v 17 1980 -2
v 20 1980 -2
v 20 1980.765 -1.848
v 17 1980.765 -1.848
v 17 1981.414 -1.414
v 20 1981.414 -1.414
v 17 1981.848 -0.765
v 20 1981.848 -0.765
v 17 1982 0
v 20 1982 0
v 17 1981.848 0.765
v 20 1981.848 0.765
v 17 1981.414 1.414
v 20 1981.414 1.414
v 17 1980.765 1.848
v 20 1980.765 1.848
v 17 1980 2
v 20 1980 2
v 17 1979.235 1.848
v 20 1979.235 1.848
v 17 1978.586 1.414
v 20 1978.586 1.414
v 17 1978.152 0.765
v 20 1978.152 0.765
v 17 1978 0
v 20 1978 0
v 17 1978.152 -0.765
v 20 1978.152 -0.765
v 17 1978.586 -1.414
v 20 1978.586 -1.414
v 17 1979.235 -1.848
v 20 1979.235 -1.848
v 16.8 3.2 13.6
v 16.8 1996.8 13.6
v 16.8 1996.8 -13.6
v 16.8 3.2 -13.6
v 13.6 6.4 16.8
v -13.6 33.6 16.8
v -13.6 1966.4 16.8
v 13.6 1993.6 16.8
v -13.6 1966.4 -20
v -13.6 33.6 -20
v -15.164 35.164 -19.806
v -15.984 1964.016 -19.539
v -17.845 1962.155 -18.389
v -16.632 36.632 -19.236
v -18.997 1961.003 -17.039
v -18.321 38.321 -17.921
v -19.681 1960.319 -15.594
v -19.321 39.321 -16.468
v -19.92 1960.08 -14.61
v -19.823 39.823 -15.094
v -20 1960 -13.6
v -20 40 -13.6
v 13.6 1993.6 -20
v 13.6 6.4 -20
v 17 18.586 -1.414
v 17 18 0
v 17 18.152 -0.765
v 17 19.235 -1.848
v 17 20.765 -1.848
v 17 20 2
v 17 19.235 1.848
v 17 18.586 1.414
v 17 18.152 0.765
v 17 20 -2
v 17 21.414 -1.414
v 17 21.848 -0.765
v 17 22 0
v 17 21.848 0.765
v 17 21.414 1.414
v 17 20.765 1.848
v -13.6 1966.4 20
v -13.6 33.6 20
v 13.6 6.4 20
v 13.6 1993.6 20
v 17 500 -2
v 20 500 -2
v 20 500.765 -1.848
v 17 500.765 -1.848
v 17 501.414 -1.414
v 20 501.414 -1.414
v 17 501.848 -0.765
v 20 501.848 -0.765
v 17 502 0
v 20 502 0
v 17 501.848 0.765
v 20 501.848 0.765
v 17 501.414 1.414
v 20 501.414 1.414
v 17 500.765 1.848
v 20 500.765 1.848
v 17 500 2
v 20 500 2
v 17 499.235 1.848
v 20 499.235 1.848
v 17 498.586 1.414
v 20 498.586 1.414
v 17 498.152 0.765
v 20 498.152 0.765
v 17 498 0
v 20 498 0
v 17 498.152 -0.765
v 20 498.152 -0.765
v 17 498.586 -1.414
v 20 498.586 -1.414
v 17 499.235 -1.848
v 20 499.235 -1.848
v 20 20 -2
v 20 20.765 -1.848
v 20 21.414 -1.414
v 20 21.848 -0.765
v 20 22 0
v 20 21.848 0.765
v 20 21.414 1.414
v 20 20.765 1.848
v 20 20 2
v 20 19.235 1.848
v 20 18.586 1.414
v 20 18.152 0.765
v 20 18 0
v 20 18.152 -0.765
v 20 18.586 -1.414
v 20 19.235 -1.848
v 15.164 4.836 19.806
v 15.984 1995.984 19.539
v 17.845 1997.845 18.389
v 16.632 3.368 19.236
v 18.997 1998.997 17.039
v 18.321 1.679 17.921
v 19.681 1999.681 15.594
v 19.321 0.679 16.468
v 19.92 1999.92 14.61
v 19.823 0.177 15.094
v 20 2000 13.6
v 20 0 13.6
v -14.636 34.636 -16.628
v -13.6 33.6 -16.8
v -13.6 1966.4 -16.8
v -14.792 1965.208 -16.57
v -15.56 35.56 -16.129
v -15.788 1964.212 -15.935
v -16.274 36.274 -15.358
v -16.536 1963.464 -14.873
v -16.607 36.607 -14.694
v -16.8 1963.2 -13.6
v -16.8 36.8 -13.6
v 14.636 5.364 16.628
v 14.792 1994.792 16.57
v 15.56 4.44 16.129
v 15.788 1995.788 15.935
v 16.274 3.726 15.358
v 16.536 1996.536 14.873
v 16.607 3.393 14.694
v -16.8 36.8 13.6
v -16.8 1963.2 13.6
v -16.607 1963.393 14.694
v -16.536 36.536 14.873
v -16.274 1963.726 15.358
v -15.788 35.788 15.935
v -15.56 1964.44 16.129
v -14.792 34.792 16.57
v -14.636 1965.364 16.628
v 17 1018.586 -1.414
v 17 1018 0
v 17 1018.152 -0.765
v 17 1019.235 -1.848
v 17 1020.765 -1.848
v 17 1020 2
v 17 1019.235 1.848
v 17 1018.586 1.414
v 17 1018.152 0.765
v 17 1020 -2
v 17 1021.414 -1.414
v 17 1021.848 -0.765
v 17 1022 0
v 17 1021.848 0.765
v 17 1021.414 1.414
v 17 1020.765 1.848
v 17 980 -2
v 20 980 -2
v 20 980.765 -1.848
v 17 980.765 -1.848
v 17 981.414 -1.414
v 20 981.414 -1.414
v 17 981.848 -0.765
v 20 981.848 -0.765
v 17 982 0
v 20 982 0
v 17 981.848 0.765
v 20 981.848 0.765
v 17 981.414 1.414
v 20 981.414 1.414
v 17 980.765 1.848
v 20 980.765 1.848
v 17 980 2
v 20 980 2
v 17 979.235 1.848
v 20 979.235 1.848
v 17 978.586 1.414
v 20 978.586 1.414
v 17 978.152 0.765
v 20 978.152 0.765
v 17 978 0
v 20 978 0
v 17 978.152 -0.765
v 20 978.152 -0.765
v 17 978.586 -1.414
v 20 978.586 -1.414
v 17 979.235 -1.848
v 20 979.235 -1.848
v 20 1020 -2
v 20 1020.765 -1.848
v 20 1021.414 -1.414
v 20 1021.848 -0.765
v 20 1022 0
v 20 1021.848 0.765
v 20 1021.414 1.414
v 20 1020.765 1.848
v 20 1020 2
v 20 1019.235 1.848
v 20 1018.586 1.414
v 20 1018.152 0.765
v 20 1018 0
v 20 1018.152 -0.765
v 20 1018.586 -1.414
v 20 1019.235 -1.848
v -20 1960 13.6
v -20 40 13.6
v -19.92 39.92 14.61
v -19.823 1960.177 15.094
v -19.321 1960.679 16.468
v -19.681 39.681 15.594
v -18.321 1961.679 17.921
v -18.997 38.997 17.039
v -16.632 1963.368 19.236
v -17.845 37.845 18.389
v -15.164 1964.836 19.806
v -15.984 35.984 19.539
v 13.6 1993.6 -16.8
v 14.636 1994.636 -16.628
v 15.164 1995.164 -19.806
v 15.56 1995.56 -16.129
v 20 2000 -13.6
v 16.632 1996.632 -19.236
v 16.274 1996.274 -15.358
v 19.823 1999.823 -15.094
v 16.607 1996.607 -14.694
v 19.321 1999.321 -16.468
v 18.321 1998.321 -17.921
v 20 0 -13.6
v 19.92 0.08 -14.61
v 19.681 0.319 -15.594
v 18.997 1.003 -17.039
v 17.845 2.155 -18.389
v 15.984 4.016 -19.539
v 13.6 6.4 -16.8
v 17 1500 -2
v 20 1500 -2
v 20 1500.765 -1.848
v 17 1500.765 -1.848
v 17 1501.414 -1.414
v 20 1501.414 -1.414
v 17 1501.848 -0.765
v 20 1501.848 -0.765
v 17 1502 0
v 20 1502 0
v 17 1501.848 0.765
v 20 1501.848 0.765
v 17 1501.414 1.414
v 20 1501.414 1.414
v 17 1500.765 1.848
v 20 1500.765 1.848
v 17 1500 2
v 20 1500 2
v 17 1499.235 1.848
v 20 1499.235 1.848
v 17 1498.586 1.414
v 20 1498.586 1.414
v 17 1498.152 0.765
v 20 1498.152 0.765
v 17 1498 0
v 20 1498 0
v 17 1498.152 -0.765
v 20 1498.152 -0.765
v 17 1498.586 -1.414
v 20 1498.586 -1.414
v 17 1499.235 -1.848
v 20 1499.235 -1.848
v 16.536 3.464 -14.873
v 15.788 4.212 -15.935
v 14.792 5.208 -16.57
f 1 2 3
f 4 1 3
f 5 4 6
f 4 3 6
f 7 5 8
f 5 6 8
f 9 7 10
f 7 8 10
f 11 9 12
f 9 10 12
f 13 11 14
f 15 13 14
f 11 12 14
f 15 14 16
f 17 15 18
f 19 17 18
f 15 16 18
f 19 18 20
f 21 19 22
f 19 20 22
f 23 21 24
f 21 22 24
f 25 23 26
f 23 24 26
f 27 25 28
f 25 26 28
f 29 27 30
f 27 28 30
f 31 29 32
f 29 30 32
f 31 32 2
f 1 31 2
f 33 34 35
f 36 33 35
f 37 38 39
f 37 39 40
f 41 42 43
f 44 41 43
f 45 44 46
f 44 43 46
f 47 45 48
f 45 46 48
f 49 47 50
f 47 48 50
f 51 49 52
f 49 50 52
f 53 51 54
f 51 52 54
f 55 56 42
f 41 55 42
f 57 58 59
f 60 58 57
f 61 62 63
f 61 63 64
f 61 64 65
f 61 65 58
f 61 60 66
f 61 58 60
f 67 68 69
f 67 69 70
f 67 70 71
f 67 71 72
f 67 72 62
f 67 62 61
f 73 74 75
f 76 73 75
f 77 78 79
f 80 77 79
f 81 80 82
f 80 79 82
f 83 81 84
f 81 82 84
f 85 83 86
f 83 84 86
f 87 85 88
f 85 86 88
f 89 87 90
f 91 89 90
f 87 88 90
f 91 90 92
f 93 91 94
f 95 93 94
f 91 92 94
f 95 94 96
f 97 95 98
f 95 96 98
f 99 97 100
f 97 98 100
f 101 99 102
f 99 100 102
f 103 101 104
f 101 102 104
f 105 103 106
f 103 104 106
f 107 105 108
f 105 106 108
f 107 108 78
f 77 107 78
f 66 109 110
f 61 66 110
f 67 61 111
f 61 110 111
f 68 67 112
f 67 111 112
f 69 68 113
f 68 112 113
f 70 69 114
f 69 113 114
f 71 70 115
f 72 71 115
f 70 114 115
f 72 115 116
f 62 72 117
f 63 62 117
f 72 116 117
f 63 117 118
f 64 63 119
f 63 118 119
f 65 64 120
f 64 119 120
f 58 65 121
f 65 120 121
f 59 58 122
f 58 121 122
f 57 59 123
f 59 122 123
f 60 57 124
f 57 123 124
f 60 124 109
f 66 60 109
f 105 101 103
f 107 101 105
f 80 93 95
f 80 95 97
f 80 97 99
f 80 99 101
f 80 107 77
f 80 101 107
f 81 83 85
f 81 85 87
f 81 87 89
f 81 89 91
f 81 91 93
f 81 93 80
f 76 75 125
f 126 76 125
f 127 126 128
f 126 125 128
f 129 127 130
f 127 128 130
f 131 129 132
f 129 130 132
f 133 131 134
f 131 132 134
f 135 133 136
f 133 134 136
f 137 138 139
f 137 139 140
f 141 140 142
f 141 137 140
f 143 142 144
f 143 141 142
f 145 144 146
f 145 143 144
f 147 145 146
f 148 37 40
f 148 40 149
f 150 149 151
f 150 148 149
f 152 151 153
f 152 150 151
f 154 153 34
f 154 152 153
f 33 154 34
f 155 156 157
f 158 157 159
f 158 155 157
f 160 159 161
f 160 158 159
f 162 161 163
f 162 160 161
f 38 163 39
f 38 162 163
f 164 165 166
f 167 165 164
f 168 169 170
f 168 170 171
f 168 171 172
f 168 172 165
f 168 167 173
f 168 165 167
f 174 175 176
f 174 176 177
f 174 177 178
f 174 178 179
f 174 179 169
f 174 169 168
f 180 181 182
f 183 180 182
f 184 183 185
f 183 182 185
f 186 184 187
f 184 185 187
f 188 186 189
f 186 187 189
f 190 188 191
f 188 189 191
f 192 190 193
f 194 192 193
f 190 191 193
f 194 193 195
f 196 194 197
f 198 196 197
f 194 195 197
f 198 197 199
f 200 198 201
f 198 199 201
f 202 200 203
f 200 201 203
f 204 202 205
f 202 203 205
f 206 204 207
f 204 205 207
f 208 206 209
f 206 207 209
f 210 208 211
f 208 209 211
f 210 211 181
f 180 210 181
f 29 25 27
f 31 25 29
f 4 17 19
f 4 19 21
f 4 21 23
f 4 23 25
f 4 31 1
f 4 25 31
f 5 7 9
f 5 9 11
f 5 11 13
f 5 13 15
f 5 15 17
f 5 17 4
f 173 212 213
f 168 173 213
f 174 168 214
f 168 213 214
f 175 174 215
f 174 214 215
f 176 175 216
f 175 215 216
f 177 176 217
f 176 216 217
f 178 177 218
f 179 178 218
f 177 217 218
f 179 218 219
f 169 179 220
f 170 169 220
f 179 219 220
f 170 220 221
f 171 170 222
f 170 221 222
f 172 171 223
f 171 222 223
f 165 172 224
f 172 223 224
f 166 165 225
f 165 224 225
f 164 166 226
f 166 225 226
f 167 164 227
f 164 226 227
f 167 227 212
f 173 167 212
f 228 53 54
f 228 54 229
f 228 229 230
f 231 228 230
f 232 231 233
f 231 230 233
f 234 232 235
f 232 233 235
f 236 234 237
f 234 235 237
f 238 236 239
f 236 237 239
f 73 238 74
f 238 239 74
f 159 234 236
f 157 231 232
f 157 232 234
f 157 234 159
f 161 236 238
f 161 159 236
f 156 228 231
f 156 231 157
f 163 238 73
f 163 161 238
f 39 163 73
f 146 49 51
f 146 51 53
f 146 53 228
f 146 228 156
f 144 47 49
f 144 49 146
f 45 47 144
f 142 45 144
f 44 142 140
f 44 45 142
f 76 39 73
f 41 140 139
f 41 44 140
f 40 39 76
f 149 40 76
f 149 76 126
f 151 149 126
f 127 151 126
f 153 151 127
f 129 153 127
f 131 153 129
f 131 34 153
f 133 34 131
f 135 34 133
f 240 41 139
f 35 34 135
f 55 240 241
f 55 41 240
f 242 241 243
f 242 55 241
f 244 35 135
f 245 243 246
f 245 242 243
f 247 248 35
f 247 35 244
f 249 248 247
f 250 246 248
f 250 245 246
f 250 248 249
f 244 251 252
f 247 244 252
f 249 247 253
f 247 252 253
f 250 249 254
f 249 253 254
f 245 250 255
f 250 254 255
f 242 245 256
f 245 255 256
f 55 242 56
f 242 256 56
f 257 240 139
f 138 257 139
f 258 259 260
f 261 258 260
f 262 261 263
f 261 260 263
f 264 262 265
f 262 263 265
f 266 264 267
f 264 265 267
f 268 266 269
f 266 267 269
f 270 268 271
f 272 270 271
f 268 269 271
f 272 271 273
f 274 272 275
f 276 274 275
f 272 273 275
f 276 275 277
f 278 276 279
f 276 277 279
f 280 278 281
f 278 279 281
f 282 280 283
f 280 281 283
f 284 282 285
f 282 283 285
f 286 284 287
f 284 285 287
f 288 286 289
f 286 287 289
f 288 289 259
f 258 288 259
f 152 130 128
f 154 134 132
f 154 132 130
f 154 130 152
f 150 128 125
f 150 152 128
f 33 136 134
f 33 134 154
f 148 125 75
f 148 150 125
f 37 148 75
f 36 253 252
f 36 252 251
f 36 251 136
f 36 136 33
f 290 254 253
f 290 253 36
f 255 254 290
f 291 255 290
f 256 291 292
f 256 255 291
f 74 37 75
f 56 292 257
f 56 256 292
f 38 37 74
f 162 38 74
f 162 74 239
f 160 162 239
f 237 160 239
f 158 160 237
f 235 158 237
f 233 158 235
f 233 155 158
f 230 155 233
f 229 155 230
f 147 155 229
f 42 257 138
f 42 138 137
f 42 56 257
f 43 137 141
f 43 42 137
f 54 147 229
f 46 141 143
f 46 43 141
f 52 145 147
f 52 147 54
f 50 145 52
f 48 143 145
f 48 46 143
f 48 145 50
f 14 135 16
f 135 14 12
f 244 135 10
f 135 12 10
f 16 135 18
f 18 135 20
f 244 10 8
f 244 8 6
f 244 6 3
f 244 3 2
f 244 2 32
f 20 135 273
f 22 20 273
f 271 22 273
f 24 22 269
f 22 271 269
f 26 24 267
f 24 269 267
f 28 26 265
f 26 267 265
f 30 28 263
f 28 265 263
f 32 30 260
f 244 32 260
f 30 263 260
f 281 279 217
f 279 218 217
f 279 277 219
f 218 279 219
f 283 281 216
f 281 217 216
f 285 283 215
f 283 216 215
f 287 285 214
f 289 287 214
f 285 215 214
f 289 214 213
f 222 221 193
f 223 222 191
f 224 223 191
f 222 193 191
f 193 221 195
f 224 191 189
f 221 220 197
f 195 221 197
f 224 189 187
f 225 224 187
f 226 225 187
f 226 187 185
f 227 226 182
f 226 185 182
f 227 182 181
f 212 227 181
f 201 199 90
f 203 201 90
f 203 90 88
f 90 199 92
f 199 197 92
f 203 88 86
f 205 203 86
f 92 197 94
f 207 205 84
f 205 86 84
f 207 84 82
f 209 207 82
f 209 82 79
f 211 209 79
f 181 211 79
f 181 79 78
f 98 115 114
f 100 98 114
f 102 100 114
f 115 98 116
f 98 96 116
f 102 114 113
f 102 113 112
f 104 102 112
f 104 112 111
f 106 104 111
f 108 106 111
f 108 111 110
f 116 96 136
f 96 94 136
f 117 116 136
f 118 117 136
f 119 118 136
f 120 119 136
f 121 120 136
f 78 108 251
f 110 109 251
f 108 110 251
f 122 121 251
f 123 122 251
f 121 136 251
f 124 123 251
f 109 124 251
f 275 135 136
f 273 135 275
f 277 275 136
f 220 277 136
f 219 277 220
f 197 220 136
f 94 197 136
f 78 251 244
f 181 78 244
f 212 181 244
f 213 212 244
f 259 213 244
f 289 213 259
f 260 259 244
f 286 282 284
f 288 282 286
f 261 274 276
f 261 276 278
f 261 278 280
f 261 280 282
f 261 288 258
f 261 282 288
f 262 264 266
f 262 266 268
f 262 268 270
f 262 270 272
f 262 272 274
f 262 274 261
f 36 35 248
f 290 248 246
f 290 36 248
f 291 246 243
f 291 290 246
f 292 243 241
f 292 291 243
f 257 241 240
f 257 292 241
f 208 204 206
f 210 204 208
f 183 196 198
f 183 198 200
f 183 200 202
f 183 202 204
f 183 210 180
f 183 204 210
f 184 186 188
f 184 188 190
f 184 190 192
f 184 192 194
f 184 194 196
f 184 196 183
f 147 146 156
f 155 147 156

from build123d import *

# Parameters (mm, degrees)
TUBE_SQUARE_40_X_40_X_3_2_1_DEPTH = 2000
CUT_EXTRUDE1_DEPTH                = 2001.499937516
SKETCH17_R                        = 2
CUT_EXTRUDE2_DEPTH                = 3


with BuildPart() as part:
    # Sketch15 → Tube (square) 40 X 40 X 3.2(1) (new body)
    with BuildSketch(Plane(origin=(0, 0, 0), x_dir=(-1, 0, 0), z_dir=(0, 1, 0))):
        with BuildLine():
            Line((-13.6, -20), (13.6, -20))
            ThreePointArc((13.6, -20), (18.1254834, -18.1254834), (20, -13.6))
            Line((20, -13.6), (20, 13.6))
            ThreePointArc((20, 13.6), (18.1254834, 18.1254834), (13.6, 20))
            Line((13.6, 20), (-13.6, 20))
            ThreePointArc((-13.6, 20), (-18.1254834, 18.1254834), (-20, 13.6))
            Line((-20, 13.6), (-20, -13.6))
            ThreePointArc((-20, -13.6), (-18.1254834, -18.1254834), (-13.6, -20))
        make_face()
        with BuildLine():
            Line((-13.6, -16.8), (13.6, -16.8))
            ThreePointArc((13.6, -16.8), (15.8627417, -15.8627417), (16.8, -13.6))
            Line((16.8, -13.6), (16.8, 13.6))
            ThreePointArc((16.8, 13.6), (15.8627417, 15.8627417), (13.6, 16.8))
            Line((13.6, 16.8), (-13.6, 16.8))
            ThreePointArc((-13.6, 16.8), (-15.8627417, 15.8627417), (-16.8, 13.6))
            Line((-16.8, 13.6), (-16.8, -13.6))
            ThreePointArc((-16.8, -13.6), (-15.8627417, -15.8627417), (-13.6, -16.8))
        make_face(mode=Mode.SUBTRACT)
    extrude(amount=TUBE_SQUARE_40_X_40_X_3_2_1_DEPTH)

    # Sketch13 → Cut-Extrude1 (cut, through all)
    with BuildSketch(Plane(origin=(0, 0, -20), x_dir=(-1, 0, 0), z_dir=(0, 0, -1))):
        Polygon((20, 1960), (-20, 2000), (20, 2000), align=None)
        Polygon((-20, 0), (20, 40), (20, 0), align=None)
    extrude(amount=-CUT_EXTRUDE1_DEPTH, mode=Mode.SUBTRACT)

    # Sketch17 → Cut-Extrude2 (cut)
    with BuildSketch(Plane(origin=(20, 0, 0), x_dir=(0, 0, -1), z_dir=(1, 0, 0))):
        with Locations((0, 1980)):
            Circle(SKETCH17_R)
        with Locations((0, 20)):
            Circle(SKETCH17_R)
        with Locations((0, 1020)):
            Circle(SKETCH17_R)
        with Locations((0, 980)):
            Circle(SKETCH17_R)
        with Locations((0, 500)):
            Circle(SKETCH17_R)
        with Locations((0, 1500)):
            Circle(SKETCH17_R)
    extrude(amount=-CUT_EXTRUDE2_DEPTH, mode=Mode.SUBTRACT)


solid = part.part
